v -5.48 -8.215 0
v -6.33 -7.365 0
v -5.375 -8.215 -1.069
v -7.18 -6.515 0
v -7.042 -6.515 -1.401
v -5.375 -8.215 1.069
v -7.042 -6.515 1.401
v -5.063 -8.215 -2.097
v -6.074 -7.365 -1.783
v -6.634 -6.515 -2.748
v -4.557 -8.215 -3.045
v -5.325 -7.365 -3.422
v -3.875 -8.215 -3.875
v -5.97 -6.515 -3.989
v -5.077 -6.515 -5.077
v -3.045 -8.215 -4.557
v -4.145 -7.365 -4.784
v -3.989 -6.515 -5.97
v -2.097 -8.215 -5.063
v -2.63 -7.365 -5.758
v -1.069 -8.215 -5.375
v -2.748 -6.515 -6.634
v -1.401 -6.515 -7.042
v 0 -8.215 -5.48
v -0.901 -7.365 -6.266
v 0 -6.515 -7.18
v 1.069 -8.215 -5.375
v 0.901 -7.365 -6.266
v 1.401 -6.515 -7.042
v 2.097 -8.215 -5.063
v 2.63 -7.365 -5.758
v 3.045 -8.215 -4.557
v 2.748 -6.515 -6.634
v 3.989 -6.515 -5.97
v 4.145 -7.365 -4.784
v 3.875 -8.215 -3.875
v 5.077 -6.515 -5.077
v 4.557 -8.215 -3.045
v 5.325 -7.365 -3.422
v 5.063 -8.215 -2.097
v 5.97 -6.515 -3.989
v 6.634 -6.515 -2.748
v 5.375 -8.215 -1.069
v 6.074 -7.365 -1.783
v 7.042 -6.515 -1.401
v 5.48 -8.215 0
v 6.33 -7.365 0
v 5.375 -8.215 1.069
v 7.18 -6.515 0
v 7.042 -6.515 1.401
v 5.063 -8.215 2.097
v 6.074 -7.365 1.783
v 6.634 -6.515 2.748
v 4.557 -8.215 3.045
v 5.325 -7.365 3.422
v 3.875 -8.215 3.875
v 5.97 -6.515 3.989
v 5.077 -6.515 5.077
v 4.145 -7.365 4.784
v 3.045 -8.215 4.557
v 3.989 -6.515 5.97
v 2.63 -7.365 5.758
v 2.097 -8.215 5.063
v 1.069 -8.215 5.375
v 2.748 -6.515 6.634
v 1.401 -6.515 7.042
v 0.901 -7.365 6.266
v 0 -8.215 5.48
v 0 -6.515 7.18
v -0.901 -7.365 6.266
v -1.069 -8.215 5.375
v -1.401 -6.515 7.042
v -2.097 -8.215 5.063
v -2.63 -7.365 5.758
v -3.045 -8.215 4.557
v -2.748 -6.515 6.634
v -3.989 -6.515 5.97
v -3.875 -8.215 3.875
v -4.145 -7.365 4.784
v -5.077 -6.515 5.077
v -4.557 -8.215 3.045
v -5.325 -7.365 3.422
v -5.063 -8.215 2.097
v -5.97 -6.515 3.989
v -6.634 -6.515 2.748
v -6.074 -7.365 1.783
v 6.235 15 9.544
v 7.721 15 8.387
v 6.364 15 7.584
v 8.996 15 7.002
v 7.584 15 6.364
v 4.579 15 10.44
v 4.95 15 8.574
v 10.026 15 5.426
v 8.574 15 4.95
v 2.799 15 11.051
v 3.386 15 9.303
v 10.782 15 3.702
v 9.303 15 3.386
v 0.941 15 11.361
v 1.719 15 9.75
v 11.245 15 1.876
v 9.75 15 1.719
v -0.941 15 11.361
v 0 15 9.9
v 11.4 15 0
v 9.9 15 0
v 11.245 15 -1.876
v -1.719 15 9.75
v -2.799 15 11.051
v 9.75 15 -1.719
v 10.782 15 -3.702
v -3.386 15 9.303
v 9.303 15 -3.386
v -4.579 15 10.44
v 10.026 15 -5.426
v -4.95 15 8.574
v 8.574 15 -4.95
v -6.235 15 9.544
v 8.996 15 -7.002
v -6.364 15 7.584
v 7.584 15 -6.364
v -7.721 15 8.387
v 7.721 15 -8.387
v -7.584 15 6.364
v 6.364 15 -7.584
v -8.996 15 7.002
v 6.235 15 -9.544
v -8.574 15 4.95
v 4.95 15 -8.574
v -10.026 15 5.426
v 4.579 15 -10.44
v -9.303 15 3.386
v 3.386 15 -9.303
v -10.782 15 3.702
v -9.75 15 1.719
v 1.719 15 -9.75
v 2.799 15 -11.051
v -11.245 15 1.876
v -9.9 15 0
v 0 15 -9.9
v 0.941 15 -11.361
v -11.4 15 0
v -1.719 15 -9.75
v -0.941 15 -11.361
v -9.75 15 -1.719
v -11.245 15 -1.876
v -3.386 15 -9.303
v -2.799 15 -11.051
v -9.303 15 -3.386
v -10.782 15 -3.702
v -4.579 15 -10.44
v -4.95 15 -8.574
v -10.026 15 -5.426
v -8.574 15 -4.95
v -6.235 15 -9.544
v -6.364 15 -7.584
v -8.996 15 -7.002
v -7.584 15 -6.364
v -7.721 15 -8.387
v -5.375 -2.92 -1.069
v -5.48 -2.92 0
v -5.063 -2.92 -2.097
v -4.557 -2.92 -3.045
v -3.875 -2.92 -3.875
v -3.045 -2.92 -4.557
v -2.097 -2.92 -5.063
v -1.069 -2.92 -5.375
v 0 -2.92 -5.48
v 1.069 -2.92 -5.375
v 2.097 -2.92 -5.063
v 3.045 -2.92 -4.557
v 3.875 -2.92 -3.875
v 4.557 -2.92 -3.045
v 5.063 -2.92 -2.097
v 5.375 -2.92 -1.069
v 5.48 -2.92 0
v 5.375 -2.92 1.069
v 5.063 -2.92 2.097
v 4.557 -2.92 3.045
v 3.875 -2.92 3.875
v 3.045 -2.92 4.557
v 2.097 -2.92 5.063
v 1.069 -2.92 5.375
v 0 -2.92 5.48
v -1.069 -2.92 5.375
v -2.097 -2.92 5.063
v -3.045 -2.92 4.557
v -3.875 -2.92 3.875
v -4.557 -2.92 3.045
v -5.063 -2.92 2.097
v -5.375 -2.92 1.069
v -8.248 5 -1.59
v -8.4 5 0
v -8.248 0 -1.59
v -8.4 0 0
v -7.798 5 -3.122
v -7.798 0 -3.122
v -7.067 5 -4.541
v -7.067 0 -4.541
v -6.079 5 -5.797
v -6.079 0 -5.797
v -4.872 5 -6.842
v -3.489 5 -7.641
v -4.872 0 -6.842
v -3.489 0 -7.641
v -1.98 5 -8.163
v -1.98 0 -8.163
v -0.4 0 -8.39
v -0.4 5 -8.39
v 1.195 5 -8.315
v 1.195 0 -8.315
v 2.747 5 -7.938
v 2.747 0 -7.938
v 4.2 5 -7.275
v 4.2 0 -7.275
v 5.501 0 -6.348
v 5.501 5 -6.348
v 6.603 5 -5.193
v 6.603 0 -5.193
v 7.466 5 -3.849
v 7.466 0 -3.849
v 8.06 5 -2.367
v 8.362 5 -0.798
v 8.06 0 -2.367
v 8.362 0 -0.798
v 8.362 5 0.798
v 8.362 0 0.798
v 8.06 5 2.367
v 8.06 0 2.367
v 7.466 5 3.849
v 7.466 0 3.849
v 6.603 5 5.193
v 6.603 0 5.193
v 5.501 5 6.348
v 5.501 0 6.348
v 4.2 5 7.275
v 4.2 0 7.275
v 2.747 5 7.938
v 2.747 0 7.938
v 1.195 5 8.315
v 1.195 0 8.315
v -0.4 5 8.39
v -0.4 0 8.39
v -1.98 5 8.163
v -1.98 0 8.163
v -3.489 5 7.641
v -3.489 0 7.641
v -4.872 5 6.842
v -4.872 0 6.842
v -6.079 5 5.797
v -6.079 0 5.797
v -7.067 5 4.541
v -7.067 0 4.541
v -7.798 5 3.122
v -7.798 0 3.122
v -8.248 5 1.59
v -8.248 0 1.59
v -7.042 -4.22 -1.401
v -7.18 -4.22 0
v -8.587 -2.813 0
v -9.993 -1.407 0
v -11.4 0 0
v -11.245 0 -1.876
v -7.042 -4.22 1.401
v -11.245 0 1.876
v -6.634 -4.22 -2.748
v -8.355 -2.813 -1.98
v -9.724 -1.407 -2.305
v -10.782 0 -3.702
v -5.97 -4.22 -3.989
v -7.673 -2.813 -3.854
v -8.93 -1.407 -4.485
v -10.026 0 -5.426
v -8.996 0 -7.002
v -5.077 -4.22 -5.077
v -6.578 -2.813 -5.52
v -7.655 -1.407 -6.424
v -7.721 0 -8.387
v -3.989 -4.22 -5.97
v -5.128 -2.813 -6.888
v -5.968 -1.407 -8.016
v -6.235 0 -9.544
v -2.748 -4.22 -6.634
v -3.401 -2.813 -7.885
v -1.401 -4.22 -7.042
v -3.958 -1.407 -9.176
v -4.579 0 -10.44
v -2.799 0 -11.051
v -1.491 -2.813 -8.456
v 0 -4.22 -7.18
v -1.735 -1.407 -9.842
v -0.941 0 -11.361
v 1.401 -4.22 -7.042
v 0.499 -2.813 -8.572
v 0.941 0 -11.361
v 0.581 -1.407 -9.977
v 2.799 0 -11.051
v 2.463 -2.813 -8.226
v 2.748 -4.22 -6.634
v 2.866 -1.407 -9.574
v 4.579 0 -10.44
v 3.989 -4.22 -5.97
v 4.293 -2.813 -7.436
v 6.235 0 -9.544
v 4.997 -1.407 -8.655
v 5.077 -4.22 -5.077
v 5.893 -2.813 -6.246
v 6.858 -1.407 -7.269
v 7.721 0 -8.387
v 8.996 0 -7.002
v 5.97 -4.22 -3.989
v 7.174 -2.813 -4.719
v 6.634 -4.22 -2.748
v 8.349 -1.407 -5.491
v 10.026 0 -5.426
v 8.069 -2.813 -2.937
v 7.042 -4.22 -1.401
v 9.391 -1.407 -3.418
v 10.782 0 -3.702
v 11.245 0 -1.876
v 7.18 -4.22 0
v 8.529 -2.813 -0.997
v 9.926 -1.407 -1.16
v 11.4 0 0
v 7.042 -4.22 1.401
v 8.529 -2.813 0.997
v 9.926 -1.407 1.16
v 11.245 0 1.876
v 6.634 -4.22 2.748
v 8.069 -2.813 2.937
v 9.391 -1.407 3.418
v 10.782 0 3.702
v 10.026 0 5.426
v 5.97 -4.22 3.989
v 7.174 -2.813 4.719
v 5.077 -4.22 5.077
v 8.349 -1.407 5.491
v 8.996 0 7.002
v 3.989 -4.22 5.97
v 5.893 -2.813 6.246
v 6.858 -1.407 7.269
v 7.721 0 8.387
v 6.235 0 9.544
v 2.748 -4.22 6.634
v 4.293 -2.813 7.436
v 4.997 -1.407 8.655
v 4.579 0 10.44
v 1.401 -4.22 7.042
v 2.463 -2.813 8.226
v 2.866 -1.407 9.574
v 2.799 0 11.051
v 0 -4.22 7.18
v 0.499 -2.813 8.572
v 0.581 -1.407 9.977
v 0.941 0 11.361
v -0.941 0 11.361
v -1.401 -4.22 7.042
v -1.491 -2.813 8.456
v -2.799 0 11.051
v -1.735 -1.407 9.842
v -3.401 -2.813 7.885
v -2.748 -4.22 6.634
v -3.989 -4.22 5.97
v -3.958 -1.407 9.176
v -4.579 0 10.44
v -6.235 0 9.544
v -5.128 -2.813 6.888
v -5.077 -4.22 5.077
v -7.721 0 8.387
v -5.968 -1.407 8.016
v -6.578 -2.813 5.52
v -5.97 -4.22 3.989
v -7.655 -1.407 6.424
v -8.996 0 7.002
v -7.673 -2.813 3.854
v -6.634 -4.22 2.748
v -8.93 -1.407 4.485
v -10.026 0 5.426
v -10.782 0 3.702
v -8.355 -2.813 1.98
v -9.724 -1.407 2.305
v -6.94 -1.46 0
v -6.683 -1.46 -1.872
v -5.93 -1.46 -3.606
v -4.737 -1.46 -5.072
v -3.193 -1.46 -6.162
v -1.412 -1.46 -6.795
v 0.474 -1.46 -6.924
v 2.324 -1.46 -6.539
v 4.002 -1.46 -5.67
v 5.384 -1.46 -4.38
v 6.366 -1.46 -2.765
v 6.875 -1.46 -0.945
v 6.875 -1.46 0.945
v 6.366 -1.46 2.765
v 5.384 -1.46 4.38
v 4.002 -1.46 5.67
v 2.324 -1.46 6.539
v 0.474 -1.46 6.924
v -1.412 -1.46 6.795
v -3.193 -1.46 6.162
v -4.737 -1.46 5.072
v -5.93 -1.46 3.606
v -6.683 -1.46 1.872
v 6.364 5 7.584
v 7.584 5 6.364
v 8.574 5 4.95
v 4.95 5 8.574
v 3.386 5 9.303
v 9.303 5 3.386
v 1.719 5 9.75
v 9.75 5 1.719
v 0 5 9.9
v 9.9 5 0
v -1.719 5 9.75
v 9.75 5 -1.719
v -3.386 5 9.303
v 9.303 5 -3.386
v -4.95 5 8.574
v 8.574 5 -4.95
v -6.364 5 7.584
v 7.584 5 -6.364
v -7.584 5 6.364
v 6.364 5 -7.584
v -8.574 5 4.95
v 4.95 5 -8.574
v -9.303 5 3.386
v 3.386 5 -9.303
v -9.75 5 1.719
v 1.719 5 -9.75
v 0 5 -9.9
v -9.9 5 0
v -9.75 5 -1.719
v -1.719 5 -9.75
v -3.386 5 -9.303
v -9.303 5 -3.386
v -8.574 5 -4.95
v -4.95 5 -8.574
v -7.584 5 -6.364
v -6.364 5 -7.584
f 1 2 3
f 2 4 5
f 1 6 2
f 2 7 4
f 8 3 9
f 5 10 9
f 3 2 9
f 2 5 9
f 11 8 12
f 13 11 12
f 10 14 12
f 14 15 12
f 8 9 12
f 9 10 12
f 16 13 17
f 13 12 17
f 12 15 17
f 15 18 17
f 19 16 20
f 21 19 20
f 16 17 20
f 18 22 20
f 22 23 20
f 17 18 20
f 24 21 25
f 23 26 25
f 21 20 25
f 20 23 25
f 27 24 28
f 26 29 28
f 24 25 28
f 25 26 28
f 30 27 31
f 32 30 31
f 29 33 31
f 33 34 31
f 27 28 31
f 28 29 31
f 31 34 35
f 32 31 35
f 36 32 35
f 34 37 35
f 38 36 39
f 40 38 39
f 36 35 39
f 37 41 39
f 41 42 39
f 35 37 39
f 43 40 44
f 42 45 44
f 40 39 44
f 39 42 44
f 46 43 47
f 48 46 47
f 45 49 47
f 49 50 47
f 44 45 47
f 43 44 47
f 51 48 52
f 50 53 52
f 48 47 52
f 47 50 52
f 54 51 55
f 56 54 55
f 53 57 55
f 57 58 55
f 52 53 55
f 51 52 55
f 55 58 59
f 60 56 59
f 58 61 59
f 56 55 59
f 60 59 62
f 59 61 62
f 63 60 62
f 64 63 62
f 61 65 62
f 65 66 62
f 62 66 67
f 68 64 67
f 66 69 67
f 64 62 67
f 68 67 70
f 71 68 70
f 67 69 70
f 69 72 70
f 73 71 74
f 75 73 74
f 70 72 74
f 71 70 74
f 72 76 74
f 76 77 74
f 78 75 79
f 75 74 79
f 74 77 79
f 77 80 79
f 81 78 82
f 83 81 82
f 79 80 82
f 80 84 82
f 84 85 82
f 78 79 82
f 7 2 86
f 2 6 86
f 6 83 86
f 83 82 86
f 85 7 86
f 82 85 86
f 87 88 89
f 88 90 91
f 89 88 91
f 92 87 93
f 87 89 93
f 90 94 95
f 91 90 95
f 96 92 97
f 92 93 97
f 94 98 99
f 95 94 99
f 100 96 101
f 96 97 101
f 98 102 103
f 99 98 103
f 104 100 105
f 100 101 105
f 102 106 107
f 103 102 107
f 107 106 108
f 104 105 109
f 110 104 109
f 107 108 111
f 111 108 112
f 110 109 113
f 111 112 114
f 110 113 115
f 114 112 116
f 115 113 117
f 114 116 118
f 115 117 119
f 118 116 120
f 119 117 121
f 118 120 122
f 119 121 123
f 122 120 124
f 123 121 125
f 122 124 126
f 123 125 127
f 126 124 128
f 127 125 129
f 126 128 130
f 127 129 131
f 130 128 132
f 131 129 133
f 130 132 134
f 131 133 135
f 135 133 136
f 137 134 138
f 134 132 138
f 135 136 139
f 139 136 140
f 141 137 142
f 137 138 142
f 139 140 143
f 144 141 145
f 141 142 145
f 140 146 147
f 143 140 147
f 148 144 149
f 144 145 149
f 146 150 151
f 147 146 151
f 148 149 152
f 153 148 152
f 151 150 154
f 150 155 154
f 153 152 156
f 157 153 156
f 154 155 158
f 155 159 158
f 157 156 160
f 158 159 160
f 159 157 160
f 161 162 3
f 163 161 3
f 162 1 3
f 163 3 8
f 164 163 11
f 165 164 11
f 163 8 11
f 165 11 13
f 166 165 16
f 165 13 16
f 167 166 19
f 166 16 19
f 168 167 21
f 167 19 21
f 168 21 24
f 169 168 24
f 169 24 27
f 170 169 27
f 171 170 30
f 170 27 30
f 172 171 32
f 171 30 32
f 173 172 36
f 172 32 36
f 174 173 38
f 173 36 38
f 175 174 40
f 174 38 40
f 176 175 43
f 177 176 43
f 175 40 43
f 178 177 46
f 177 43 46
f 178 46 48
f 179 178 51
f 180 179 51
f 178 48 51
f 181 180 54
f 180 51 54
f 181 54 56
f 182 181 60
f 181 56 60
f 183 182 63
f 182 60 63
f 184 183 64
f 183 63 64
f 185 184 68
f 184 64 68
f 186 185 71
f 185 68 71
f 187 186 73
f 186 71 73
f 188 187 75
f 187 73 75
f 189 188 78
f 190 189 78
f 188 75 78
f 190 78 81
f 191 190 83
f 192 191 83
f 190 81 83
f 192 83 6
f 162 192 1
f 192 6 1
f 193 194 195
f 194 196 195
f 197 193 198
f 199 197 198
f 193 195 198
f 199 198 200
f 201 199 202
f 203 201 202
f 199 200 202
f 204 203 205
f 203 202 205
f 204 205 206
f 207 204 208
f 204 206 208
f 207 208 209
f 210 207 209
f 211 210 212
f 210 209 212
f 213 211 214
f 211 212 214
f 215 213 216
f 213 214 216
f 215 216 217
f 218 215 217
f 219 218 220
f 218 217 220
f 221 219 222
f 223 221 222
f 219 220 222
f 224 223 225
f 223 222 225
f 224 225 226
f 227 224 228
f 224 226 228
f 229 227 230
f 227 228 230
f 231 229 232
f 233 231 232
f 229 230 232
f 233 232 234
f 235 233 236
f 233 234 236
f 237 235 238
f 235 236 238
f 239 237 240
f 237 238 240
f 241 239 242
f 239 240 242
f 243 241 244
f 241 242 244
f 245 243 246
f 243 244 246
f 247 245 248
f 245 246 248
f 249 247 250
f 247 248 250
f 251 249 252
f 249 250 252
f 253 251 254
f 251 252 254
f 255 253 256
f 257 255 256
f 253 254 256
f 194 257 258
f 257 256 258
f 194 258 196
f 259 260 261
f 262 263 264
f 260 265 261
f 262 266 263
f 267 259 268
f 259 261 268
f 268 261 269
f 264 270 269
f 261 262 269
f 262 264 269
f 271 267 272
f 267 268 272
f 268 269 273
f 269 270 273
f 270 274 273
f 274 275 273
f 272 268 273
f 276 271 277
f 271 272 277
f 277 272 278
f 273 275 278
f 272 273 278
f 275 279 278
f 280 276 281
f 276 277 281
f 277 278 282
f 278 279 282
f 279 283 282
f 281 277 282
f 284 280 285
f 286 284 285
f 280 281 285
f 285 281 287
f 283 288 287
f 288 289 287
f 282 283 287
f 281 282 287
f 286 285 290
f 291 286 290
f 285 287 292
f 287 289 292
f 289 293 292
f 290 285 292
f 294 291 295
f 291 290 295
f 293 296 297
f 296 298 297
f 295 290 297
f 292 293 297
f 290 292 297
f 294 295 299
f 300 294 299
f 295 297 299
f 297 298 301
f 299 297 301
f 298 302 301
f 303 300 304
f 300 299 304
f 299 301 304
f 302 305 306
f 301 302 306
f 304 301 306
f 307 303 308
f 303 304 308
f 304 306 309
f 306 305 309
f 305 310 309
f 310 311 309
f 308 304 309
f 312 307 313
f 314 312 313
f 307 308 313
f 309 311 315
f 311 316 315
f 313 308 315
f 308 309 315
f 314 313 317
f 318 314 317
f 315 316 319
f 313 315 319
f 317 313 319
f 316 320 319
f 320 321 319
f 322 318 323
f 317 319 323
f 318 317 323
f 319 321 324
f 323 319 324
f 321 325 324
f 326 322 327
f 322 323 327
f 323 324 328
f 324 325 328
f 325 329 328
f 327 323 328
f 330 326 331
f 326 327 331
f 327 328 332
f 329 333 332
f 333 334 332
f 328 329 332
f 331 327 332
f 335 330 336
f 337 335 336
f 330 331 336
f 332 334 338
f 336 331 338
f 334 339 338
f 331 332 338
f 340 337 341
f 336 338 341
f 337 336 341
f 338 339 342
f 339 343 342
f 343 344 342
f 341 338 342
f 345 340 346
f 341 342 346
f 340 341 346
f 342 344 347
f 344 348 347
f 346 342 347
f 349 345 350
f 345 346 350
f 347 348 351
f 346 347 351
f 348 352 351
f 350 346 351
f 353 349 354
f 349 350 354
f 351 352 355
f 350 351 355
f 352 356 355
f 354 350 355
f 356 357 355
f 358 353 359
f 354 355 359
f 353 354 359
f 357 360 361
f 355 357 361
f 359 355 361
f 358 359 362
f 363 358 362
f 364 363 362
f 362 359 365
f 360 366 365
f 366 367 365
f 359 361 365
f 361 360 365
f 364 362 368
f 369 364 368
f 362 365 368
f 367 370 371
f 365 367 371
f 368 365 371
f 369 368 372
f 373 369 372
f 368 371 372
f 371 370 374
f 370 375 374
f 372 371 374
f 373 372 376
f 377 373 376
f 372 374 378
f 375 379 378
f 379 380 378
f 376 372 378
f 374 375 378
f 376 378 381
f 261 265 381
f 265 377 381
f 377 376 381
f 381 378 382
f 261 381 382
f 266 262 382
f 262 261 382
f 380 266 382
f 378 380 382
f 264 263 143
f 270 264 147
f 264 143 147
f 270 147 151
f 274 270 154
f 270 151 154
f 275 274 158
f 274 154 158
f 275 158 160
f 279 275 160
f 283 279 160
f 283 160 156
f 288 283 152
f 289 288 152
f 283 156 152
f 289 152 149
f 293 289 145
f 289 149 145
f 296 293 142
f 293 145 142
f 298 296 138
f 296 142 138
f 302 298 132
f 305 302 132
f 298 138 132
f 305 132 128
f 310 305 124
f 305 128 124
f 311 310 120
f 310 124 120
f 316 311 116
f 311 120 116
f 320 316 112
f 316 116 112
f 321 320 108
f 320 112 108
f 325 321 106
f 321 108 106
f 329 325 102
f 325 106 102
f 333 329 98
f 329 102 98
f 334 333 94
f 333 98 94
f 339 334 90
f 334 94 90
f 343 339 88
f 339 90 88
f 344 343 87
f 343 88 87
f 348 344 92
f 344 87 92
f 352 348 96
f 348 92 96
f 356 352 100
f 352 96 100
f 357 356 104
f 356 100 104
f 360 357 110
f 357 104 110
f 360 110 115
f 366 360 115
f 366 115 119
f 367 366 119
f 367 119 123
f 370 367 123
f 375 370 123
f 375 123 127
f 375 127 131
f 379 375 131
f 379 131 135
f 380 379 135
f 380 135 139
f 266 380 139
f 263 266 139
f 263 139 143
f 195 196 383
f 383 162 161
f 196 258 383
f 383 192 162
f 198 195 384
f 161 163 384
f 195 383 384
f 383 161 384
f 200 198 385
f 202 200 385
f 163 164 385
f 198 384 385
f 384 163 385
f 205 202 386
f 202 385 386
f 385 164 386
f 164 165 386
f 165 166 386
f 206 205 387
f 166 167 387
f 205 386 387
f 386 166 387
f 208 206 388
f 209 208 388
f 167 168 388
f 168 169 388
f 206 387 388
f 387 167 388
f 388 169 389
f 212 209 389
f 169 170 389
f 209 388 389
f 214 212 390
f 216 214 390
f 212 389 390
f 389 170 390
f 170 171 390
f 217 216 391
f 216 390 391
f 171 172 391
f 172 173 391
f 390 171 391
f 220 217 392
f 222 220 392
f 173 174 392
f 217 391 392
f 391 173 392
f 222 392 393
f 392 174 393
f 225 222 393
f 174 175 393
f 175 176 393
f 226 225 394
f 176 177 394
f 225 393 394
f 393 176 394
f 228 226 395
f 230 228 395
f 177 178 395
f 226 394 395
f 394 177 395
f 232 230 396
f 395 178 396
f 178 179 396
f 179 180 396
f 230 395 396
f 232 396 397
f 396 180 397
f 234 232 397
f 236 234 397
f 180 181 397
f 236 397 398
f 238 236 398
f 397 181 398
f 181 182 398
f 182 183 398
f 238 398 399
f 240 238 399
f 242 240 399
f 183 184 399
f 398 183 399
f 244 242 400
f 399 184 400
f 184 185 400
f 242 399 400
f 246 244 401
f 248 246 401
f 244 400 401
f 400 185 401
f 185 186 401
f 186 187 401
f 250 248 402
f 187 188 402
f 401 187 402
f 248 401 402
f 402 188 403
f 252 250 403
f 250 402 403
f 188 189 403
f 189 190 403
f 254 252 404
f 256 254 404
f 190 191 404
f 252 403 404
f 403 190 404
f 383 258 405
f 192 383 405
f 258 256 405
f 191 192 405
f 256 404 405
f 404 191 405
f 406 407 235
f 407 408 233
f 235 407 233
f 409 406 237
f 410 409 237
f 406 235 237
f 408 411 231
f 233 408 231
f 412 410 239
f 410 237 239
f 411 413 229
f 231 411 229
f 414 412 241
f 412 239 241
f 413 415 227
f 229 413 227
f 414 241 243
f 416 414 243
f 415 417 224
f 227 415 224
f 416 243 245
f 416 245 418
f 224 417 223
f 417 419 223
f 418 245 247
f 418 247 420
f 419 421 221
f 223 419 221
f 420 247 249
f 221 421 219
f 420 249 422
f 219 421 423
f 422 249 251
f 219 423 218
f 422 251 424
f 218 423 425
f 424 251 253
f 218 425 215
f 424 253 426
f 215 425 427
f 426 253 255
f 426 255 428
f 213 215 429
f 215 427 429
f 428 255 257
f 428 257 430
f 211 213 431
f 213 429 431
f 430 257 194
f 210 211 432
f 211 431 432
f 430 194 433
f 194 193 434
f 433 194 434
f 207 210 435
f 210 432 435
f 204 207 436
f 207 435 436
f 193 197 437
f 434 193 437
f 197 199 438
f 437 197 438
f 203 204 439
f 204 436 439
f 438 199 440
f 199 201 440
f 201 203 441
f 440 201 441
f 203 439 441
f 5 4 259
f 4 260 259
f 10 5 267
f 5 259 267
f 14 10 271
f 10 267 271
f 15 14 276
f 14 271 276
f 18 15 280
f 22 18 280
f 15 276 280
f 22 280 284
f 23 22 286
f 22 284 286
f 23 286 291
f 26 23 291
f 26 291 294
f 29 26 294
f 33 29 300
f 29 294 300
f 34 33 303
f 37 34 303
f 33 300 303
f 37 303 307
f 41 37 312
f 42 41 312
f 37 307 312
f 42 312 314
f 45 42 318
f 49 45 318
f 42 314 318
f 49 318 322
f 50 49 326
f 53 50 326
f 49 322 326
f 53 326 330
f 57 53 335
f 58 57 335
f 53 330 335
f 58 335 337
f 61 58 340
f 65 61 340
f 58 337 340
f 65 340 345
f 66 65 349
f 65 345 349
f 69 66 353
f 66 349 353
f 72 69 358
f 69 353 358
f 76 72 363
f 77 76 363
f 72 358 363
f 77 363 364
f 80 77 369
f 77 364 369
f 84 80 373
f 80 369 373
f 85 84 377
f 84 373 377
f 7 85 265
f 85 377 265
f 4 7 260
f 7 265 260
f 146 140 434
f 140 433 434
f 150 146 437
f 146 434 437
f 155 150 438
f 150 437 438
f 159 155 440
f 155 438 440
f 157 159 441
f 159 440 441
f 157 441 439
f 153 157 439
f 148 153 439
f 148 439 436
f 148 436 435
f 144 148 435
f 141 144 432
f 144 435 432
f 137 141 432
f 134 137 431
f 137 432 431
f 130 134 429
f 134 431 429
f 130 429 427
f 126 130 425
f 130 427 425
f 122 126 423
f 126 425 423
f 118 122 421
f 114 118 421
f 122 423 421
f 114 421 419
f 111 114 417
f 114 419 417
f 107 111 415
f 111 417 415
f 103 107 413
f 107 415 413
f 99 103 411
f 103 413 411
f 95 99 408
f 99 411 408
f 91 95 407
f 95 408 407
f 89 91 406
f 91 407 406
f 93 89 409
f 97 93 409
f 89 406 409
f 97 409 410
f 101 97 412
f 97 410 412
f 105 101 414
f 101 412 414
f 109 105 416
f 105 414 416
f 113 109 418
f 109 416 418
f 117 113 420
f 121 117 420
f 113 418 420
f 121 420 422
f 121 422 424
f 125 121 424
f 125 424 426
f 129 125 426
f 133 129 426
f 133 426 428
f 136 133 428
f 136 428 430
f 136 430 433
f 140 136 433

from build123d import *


with BuildPart() as part:
    # Sketch1 → Revolve1 (revolve)
    with BuildSketch(Plane.XY, mode=Mode.PRIVATE) as revolve1_sk:
        Polygon((7.180253608, -6.515318278), (7.180253608, -4.219746392), (5.480253608, -5.919746392), (5.480253608, -8.215318278), align=None)
        Polygon((7.4, -1), (5.480253608, -2.919746392), (5.480253608, -5.919746392), (7.4, -4), align=None)
        Polygon((7.4, -1), (7.4, -4), (11.4, 0), (11.4, 3), (8.4, 0), align=None)
        Polygon((8.4, 0), (11.4, 3), (11.4, 15), (9.9, 15), (9.9, 5), (8.4, 5), align=None)
    revolve(revolve1_sk.sketch.rotate(Axis((0, 51.27419464, 0), (0, -1, 0)), 180), axis=Axis((0, 51.27419464, 0), (0, -1, 0)))


solid = part.part
